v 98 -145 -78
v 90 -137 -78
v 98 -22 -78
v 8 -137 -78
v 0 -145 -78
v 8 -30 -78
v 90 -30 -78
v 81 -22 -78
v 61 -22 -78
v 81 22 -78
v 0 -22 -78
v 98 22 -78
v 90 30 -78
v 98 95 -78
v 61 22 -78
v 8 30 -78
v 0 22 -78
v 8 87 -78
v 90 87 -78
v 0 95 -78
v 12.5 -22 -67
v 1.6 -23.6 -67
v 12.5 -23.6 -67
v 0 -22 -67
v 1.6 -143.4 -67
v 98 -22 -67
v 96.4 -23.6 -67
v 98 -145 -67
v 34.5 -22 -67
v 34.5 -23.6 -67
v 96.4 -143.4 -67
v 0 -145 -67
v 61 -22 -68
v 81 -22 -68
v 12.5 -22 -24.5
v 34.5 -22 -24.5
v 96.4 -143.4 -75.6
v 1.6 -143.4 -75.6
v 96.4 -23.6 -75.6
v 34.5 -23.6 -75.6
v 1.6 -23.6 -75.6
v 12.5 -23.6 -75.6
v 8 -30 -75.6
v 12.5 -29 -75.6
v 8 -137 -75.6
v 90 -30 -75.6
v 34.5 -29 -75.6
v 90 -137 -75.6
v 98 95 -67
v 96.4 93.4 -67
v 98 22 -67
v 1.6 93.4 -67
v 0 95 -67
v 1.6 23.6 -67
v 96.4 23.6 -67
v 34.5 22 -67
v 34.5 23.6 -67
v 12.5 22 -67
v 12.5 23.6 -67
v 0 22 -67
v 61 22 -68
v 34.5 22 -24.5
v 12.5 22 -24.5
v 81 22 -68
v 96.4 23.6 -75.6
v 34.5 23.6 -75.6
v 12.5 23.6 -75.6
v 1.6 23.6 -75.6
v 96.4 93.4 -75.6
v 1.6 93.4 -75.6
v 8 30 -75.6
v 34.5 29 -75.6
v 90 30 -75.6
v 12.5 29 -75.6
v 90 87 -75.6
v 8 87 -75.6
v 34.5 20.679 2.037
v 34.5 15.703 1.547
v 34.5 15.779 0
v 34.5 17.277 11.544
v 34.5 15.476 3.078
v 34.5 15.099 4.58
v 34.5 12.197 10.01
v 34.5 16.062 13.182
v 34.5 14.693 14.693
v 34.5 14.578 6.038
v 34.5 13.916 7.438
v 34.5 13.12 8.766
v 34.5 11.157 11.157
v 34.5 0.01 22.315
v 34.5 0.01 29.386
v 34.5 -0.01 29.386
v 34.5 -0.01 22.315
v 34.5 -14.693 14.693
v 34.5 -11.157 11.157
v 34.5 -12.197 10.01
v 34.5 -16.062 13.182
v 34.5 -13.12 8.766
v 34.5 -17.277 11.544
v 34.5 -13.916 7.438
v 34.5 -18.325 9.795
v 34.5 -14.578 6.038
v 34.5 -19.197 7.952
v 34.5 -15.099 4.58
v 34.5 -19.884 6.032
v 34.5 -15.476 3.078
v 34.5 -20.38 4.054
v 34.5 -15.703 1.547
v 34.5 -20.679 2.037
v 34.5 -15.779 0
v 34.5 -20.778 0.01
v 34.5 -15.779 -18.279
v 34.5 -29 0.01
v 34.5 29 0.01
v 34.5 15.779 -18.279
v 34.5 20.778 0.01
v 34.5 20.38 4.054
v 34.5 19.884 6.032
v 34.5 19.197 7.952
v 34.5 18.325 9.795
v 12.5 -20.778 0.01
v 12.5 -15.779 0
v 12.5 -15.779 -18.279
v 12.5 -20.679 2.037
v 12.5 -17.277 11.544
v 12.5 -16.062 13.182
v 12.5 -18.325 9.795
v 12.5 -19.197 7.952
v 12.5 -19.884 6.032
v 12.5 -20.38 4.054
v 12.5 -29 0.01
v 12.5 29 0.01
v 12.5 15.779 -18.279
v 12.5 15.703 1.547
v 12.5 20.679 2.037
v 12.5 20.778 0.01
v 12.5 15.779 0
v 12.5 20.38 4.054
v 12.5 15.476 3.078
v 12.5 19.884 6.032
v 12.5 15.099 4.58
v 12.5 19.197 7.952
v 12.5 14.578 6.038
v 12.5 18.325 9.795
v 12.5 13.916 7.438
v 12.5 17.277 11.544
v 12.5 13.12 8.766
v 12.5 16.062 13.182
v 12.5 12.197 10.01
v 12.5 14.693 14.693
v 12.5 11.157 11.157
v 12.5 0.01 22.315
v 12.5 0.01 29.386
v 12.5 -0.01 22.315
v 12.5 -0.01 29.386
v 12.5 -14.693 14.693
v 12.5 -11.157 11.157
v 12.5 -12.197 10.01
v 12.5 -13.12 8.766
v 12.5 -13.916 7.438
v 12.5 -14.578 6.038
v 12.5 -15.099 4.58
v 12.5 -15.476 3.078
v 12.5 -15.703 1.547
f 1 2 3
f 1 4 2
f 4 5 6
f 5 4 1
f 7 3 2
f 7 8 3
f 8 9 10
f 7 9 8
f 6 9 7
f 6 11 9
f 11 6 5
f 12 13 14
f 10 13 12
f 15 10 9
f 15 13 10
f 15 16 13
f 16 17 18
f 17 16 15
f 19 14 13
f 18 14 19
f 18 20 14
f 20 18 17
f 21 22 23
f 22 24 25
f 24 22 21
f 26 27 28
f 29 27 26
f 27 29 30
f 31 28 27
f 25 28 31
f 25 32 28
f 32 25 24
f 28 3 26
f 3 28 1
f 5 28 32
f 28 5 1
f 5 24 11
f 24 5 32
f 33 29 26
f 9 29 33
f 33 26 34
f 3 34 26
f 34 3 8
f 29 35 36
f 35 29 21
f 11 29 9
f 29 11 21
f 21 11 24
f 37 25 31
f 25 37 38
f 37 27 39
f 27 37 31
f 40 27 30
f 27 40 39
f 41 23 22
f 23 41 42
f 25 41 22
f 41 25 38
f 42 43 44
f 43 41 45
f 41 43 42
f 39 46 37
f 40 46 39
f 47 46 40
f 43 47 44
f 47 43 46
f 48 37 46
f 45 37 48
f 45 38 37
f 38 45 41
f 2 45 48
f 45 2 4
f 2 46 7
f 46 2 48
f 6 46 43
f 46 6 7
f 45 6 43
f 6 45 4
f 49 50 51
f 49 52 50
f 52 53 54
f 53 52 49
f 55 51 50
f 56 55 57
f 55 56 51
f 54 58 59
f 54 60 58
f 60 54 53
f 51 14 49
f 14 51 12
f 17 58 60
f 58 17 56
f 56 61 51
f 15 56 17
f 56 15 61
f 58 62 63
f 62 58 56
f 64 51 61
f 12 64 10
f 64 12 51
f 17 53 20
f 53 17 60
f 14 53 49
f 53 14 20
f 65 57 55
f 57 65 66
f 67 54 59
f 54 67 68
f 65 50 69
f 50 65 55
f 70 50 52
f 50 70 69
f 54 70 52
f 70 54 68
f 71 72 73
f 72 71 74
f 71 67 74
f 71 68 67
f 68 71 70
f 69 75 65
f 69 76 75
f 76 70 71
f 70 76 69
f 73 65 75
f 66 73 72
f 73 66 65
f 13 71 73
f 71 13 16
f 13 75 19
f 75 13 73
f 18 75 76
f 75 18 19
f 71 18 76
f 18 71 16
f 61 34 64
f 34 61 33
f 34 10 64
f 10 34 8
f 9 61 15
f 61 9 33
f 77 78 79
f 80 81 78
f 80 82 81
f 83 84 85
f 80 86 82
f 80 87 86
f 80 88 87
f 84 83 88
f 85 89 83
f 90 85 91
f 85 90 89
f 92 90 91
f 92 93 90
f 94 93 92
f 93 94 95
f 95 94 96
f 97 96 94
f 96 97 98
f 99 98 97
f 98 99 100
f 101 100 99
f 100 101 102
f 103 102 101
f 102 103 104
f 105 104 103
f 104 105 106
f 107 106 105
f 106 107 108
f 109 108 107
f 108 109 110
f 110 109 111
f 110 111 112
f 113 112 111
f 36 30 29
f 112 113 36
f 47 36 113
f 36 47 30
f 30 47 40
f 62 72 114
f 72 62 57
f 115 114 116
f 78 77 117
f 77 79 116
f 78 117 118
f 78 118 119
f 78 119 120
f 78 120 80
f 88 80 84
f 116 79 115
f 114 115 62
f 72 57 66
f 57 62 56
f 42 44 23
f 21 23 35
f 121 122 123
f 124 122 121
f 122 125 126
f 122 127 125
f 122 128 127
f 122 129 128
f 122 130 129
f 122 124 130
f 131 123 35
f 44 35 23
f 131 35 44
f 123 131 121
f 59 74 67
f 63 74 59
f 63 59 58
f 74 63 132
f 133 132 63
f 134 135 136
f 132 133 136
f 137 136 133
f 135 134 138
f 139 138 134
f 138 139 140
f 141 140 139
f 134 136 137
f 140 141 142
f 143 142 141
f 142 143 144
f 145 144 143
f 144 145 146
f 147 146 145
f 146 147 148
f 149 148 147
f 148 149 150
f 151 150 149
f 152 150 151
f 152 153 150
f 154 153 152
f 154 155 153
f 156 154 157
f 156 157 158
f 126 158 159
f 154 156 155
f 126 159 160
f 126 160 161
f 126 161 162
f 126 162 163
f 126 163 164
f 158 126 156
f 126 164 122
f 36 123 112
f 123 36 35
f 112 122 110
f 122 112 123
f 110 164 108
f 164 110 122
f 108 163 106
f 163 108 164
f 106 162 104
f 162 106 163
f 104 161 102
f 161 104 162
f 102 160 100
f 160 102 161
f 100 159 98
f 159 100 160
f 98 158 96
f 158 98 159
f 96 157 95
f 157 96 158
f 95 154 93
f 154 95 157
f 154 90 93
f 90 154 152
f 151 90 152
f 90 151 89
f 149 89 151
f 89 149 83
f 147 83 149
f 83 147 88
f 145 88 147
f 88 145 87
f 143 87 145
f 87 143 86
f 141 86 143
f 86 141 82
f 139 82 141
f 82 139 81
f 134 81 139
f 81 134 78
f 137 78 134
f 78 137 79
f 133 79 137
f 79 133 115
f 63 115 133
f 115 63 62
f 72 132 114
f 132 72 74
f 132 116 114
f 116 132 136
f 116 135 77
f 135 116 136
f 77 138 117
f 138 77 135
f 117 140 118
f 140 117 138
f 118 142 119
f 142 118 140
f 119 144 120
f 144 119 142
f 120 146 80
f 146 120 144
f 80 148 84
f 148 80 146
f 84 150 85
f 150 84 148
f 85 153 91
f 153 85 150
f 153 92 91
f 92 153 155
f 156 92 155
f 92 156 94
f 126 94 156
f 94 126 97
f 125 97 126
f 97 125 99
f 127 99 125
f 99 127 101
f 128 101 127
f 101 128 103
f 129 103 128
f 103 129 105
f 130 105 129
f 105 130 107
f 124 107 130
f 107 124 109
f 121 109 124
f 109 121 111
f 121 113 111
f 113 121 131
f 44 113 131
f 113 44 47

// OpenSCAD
// =====================================================================
//  PORTASHAMPOO PER RACCORDO DOCCINO  —  v4 (29/10/2026)
//  Parametrico: modifica le misure qui sotto e riesporta lo STL
//  (OpenSCAD: F6 = render, poi File > Export > STL).
//
//  Sistema di riferimento (stando nella doccia, guardando la parete):
//    X = orizzontale lungo il muro (+ verso l'angolo a destra)
//    Y = uscente dal muro verso di te (muro a Y = 0)
//    Z = verticale; l'asse del raccordo è a X = 0, Z = 0
//
//  v4 = v2 + modifiche dopo la prova + disegno di Nico del 29/10:
//   - base 1 (sinistra, quadrati 1-6): +5 mm a sinistra, +10 mm di profondità;
//     lato interno a 22 mm come la base 2 (parete dentro la colonna, a specchio)
//   - base 2 (destra, quadrati 7-8): +16 mm verso la parete laterale
//   - niente piedini: il fondo e la parete posteriore arrivano dritti fino
//     alle piastrelle per tutta la larghezza, anche sotto la rosetta
//   - distanziatore a pavimento tra la base 1 e la base 2, centrato sui
//     quadrati 6 e 8 (fila davanti)
//   - base 1 accorciata di 10 mm a sinistra (ingombro 240 mm)
//   - prototipo veloce: colonne 30 mm più basse
//   - "stampa_..." = pezzo già ruotato di 90° per entrare nel piatto
// =====================================================================

// ---------- QUALE PEZZO GENERARE ----------
// "stampa_rapido"   = prototipo veloce, già ruotato per il piatto (da usare in Cura)
// "stampa_bisaccia" = versione completa, già ruotata per il piatto (da usare in Cura)
// "rapido" / "bisaccia" = stessi pezzi orientati come in doccia
// "scena_rapido" / "scena_bisaccia" = anteprima con muri, raccordo, flessibili e doccino
design = "stampa_rapido";

// ---------- MISURE DEL BAGNO ----------
tubo_d        = 96 / PI; // corpo del raccordo: circonferenza 96 mm -> Ø 30,6 (confermato dal prototipo)
rosetta_d     = 60;      // diametro rosetta (stima)
rosetta_sp    = 11;      // spessore rosetta dal muro (dalla prova: i piedini restavano a 3 mm dal muro)
// misure prese dalla faccia della rosetta, lungo il raccordo:
att_da        = 16;      // 1° tubo (attacco acqua, sotto al raccordo): da 16 ...
att_a         = 26;      // ... a 26 mm
doc_da        = 52;      // 2° tubo (flessibile che entra nel porta-doccino): da 52 ...
doc_a         = 66;      // ... a 66 mm
tubo_fine     = 72;      // fine del raccordo dalla rosetta (stima)
doccino_d     = 24;      // diametro del doccino (stima)
angolo_x      = 96;      // asse raccordo -> parete laterale destra (dalla prova: mancavano 16 mm)
miscelatore_x = -188;    // bordo del miscelatore a sinistra (stima da scan)

// ---------- GANCIO ----------
gioco         = 0.5;     // gioco radiale tra gancio e raccordo
anello_y0     = rosetta_sp + 1.5;   // il gancio parte subito davanti alla rosetta
anello_l      = 22;      // lunghezza del gancio sopra al raccordo (resta prima del doccino)
anello_sp     = 5;       // spessore radiale del gancio
avvolgimento  = 180;     // gradi di avvolgimento sopra al raccordo
arco_goccia   = true;    // arco a goccia: stampabile in piedi senza supporti

// ---------- BASI ----------
parete        = 2.4;     // pareti (6 perimetri da 0,4)
fondo         = 2.4;
box_y0        = rosetta_sp + 2;  // davanti alla rosetta la parete posteriore sta qui
box_prof      = 85;      // profondità da box_y0 al bordo anteriore
box_top       = -28;     // bordo posteriore (sotto al raccordo)
box_h         = 80;      // altezza sul retro
box_calo      = 25;      // il bordo anteriore è più basso di così
box_sx        = -145;    // estremo sinistro (base 1 accorciata di 10 mm: ingombro 240 mm)
varco         = 22;      // base 2: lato interno a 22 mm dall'asse
varco_sx      = varco;   // base 1: lato interno a 22 mm, come la base 2 (la parete passa dentro la colonna)
asola_l       = 4;       // asole di scarico nel fondo
asola_passo   = 10;
abbassa_rapido = 30;     // solo prototipo veloce: colonne più basse di 30 mm (base più vicina al gancio)
// distanziatore a pavimento tra le due basi (oggetto blu del disegno)
dist_h        = 10;      // altezza
dist_p        = 20;      // profondità (lungo Y)

$fn = 64;

// ---------- valori derivati ----------
R      = tubo_d / 2;
ri     = R + gioco;
ro     = ri + anello_sp;
ay1    = anello_y0 + anello_l;
e_rapido = (design == "rapido" || design == "stampa_rapido" || design == "scena_rapido");
zb     = box_top - box_h + (e_rapido ? abbassa_rapido : 0);
by1    = box_y0 + box_prof;          // bordo anteriore
box_dx = angolo_x - 1;               // 1 mm dalla parete laterale
y_att  = rosetta_sp + (att_da + att_a) / 2;
y_doc  = rosetta_sp + (doc_da + doc_a) / 2;
y_mez  = by1 / 2;                    // traversina lunga del prototipo (divide dietro/davanti)
dist_y = (y_mez + 3 + by1 - 8) / 2;  // centro dei quadrati 6 e 8 (fila davanti)

// =====================================================================
//  GANCIO: arco sopra al raccordo + due montanti verso il box
// =====================================================================
// profilo "a goccia": sopra al raccordo le superfici non superano i 45° di sbalzo,
// così l'arco si stampa in piedi SENZA supporti e senza colature dove appoggia.
module goccia(r) {
    if (arco_goccia) hull() { circle(r = r); translate([0, r * sqrt(2) - 0.01]) square(0.02, center = true); }
    else circle(r = r);
}
module profilo_anello() {
    big = ro * 3;
    difference() {
        goccia(ro);
        goccia(ri);
        polygon(concat([[0, 0]],
            [for (a = [avvolgimento / 2 : 5 : 360 - avvolgimento / 2]) [big * sin(a), big * cos(a)]],
            [[big * sin(360 - avvolgimento / 2), big * cos(360 - avvolgimento / 2)]]));
    }
}

// montante: accanto al raccordo sta fuori dal tubo (x >= ri), sotto si sposta fino a x_in
// con uno smusso a 45° (nessun gradino orizzontale sospeso)
module profilo_montante(lato, z_fine, x_in) {
    xo = max(ro + 2, x_in + 7);
    zs = -R - 3;                    // sotto questa quota il montante può rientrare verso il centro
    mirror([lato < 0 ? 1 : 0, 0])
    polygon([[x_in, z_fine], [xo, z_fine], [xo, 0.01], [ri, 0.01], [ri, zs], [x_in, zs - (x_in - ri)]]);
}

module gancio(z_sx, z_dx, x_in_sx, x_in_dx) {
    translate([0, ay1, 0]) rotate([90, 0, 0])
    linear_extrude(anello_l)
    union() {
        profilo_anello();
        profilo_montante(-1, z_sx, x_in_sx);
        profilo_montante( 1, z_dx, x_in_dx);
    }
}

// =====================================================================
//  BASI: pianta dritta fino alle piastrelle
// =====================================================================
// pianta 2D di una base: rettangolo dritto fino alle piastrelle (Y = 0).
// Vicino al centro la base passa SOTTO la rosetta (la rosetta finisce più in alto
// del bordo delle basi), quindi niente rientro.
module pianta(x0, x1, xr) {
    translate([x0, 0]) square([x1 - x0, by1]);
}

module taglio_bordo() {
    ang = atan(box_calo / (by1 - box_y0));
    translate([-400, box_y0, box_top]) rotate([-ang, 0, 0])
        translate([0, -60, 0]) cube([800, 300, 200]);
}

module asole2d(x0, x1) {
    intersection() {
        offset(delta = -(parete + 5)) pianta(x0, x1, xr_di(x0, x1));
        for (x = [x0 : asola_passo : x1]) translate([x, -10]) square([asola_l, by1 + 20]);
    }
}
function xr_di(x0, x1) = 0;   // (non più usato: niente rientro attorno alla rosetta)

module base(x0, x1) {
    xr = xr_di(x0, x1);
    difference() {
        translate([0, 0, zb]) linear_extrude(box_h) pianta(x0, x1, xr);
        translate([0, 0, zb + fondo]) linear_extrude(box_h) offset(delta = -parete) pianta(x0, x1, xr);
        taglio_bordo();
        translate([0, 0, zb - 1]) linear_extrude(fondo + 2) asole2d(x0, x1);
    }
}

// versione "telaio" per la prova veloce: solo cornice del fondo + bordino basso (dentro vuoto)
lab_h = 11;     // altezza del bordino (prototipo veloce: 11 mm)
lab_s = 1.6;    // spessore del bordino
module base_rapido(x0, x1, colonne) {
    xr = xr_di(x0, x1);
    translate([0, 0, zb]) union() {
        linear_extrude(lab_h) difference() { pianta(x0, x1, xr); offset(delta = -lab_s) pianta(x0, x1, xr); }
        linear_extrude(fondo) difference() { pianta(x0, x1, xr); offset(delta = -8) pianta(x0, x1, xr); }
    }
}

module distanziatore() {
    translate([-varco_sx - 1, dist_y - dist_p / 2, zb]) cube([varco_sx + varco + 2, dist_p, dist_h]);
}

module bisaccia(rapido = false) {
    union() {
        if (rapido) { base_rapido(box_sx, -varco_sx, 3); base_rapido(varco, box_dx, 1); }
        else        { base(box_sx, -varco_sx);           base(varco, box_dx); }
        distanziatore();
        gancio(zb, zb, varco, varco);
    }
}

// =====================================================================
//  SCENA DI ANTEPRIMA (non stampare)
// =====================================================================
module ambiente(con_doccino = true) {
    color([0.25, 0.25, 0.27]) translate([-260, -6, -220]) cube([260 + angolo_x, 6, 420]);       // muro
    color([0.30, 0.30, 0.32]) translate([angolo_x, -6, -220]) cube([6, 260, 420]);              // parete laterale
    color("silver") rotate([-90, 0, 0]) cylinder(d = rosetta_d, h = rosetta_sp);               // rosetta
    color("silver") rotate([-90, 0, 0]) cylinder(d = tubo_d, h = rosetta_sp + tubo_fine);      // raccordo
    color([0.75, 0.75, 0.78]) translate([0, y_att, -R + 2]) mirror([0, 0, 1])                   // 1° flessibile
        cylinder(d = att_a - att_da, h = 220);
    if (con_doccino) {
    color([0.75, 0.75, 0.78]) translate([0, y_doc, -R + 2]) mirror([0, 0, 1])                   // 2° flessibile
        cylinder(d = doc_a - doc_da, h = 220);
    color("silver") translate([0, y_doc, R - 4]) cylinder(d = doccino_d, h = 165);             // doccino in piedi
    }
    color([0.8, 0.8, 0.85, 0.5]) translate([miscelatore_x - 50, 0, -100]) cube([50, 45, 140]); // miscelatore
}

module flaconi_demo(xs, ds) {
    for (i = [0 : len(xs) - 1]) color([0.2, 0.55, 0.85])
        translate([xs[i], by1 / 2, zb + fondo]) cylinder(d = ds[i], h = 190);
}

// =====================================================================
// orientato(): come in doccia, vista "Front" di OpenSCAD = dalla doccia
module orientato() { mirror([0, 1, 0]) children(); }
if (design == "stampa_rapido")   rotate([0, 0, 90]) orientato() bisaccia(true);
if (design == "stampa_bisaccia") rotate([0, 0, 90]) orientato() bisaccia();
orientato() {
    if (design == "rapido")   bisaccia(true);
    if (design == "bisaccia") bisaccia();
    if (design == "ambiente") ambiente();
    if (design == "ambiente_montaggio") ambiente(false);
    if (design == "scena_rapido")   { ambiente(); color("orange") bisaccia(true); flaconi_demo([-120, -55, 58], [65, 65, 62]); }
    if (design == "scena_bisaccia") { ambiente(); color("orange") bisaccia();     flaconi_demo([-120, -55, 58], [65, 65, 62]); }
}
